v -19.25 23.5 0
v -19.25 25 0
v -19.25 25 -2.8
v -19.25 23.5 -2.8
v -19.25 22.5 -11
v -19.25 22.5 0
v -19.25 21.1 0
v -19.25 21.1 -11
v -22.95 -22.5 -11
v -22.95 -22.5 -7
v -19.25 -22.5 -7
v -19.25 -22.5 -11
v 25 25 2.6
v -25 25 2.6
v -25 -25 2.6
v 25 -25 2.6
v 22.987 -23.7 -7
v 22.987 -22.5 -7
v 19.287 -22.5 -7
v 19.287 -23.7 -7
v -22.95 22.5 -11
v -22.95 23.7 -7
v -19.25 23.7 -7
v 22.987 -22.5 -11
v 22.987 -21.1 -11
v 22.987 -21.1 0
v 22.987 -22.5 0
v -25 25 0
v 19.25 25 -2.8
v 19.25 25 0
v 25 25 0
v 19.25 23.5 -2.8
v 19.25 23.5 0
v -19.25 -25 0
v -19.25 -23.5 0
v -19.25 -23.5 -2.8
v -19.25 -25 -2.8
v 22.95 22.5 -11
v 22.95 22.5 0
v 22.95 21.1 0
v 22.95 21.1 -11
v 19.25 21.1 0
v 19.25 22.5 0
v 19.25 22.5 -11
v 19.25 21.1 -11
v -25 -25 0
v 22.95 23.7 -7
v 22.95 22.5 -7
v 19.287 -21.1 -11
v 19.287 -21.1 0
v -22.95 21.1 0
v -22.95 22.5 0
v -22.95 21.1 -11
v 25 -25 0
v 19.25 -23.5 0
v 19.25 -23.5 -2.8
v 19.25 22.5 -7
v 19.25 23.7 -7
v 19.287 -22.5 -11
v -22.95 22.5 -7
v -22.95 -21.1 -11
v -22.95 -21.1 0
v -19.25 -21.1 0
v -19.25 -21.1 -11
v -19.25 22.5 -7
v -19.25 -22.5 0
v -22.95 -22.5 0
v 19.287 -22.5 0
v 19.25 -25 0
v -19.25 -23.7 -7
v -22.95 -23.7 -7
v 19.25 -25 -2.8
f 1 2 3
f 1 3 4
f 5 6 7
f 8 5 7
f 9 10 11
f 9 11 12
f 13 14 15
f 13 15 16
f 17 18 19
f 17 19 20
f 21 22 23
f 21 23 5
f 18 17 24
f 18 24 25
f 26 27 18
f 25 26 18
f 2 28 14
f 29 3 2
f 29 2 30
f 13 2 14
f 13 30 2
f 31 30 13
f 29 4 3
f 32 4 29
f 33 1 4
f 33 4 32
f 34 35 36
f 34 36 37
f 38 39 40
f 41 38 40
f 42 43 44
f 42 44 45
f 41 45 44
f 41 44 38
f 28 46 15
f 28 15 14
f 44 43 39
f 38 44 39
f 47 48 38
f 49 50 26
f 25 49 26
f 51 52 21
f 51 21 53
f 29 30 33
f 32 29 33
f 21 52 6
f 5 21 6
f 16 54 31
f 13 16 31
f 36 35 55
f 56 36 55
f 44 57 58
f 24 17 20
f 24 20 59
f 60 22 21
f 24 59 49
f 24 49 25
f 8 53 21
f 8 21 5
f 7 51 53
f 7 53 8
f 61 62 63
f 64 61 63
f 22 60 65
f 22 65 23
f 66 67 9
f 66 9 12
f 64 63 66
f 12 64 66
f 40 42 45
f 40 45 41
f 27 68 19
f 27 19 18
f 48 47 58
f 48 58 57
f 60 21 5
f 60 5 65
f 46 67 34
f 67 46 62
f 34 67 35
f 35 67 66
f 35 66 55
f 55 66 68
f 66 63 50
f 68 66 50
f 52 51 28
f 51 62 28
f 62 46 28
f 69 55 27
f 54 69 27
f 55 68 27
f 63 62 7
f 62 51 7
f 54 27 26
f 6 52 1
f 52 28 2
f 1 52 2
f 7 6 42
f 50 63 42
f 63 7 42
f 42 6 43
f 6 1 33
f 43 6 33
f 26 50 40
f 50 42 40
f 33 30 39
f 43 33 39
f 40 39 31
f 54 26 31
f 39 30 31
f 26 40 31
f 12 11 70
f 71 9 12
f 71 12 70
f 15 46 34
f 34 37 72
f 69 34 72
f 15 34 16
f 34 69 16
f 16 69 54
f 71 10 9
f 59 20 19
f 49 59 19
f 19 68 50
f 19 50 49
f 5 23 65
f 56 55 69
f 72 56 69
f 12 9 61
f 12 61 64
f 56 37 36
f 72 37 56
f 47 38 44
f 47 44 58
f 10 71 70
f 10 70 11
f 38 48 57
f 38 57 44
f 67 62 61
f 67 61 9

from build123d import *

# Parameters (mm, degrees)
F0_W      = 50
F0_H      = 50
F1_DEPTH  = 2.6
F3_W      = 38.5
F3_H      = 1.5
F4_DEPTH  = 2.8
F5_W      = 3.7
F5_H      = 1.4
F6_DEPTH  = 11
F9_DEPTH  = 3.7
F12_DEPTH = 3.7
F15_DEPTH = 3.7
F18_DEPTH = 3.7


with BuildPart() as f1:
    # F0 (on Top) → F1 (new body)
    with BuildSketch(Plane.XY):
        Rectangle(F0_W, F0_H)
    extrude(amount=F1_DEPTH)

    # F3 (on offset) → F4 (join)
    with BuildSketch(Plane(origin=(0, 0, 0), x_dir=(1, 0, 0), z_dir=(0, 0, -1))):
        with Locations((0, 24.25)):
            Rectangle(F3_W, F3_H)
        with Locations((0, -24.25)):
            Rectangle(F3_W, F3_H)
    extrude(amount=F4_DEPTH)

    # F5 (on offset) → F6 (join)
    with BuildSketch(Plane(origin=(0, 0, 0), x_dir=(1, 0, 0), z_dir=(0, 0, -1))):
        with Locations((21.1365766585, 21.8)):
            Rectangle(F5_W, F5_H)
        with Locations((-21.1, 21.8)):
            Rectangle(F5_W, F5_H)
        with Locations((-21.1, -21.8)):
            Rectangle(F5_W, F5_H)
        with Locations((21.1, -21.8)):
            Rectangle(F5_W, F5_H)
    extrude(amount=F6_DEPTH)

    # F8 (on offset) → F9 (join)
    with BuildSketch(Plane.YZ.offset(22.9865766585)):
        Polygon((-23.7, -7), (-22.5, -11), (-22.5, -7), align=None)
    extrude(amount=-F9_DEPTH)


with BuildPart() as f12:
    # F11 (on offset) → F12 (new body)
    with BuildSketch(Plane(origin=(-22.95, 0, 0), x_dir=(0, -1, 0), z_dir=(-1, 0, 0))):
        Polygon((22.5, -7), (22.5, -11), (23.7, -7), align=None)
    extrude(amount=-F12_DEPTH)


with BuildPart() as f15:
    # F14 (on offset) → F15 (new body)
    with BuildSketch(Plane(origin=(-22.95, 0, 0), x_dir=(0, -1, 0), z_dir=(-1, 0, 0))):
        Polygon((-23.7, -7), (-22.5, -11), (-22.5, -7), align=None)
    extrude(amount=-F15_DEPTH)


with BuildPart() as f18:
    # F17 (on offset) → F18 (new body)
    with BuildSketch(Plane.YZ.offset(22.95)):
        Polygon((22.5, -7), (22.5, -11), (23.7, -7), align=None)
    extrude(amount=-F18_DEPTH)


solid = Compound([f1.part, f12.part, f15.part, f18.part])
